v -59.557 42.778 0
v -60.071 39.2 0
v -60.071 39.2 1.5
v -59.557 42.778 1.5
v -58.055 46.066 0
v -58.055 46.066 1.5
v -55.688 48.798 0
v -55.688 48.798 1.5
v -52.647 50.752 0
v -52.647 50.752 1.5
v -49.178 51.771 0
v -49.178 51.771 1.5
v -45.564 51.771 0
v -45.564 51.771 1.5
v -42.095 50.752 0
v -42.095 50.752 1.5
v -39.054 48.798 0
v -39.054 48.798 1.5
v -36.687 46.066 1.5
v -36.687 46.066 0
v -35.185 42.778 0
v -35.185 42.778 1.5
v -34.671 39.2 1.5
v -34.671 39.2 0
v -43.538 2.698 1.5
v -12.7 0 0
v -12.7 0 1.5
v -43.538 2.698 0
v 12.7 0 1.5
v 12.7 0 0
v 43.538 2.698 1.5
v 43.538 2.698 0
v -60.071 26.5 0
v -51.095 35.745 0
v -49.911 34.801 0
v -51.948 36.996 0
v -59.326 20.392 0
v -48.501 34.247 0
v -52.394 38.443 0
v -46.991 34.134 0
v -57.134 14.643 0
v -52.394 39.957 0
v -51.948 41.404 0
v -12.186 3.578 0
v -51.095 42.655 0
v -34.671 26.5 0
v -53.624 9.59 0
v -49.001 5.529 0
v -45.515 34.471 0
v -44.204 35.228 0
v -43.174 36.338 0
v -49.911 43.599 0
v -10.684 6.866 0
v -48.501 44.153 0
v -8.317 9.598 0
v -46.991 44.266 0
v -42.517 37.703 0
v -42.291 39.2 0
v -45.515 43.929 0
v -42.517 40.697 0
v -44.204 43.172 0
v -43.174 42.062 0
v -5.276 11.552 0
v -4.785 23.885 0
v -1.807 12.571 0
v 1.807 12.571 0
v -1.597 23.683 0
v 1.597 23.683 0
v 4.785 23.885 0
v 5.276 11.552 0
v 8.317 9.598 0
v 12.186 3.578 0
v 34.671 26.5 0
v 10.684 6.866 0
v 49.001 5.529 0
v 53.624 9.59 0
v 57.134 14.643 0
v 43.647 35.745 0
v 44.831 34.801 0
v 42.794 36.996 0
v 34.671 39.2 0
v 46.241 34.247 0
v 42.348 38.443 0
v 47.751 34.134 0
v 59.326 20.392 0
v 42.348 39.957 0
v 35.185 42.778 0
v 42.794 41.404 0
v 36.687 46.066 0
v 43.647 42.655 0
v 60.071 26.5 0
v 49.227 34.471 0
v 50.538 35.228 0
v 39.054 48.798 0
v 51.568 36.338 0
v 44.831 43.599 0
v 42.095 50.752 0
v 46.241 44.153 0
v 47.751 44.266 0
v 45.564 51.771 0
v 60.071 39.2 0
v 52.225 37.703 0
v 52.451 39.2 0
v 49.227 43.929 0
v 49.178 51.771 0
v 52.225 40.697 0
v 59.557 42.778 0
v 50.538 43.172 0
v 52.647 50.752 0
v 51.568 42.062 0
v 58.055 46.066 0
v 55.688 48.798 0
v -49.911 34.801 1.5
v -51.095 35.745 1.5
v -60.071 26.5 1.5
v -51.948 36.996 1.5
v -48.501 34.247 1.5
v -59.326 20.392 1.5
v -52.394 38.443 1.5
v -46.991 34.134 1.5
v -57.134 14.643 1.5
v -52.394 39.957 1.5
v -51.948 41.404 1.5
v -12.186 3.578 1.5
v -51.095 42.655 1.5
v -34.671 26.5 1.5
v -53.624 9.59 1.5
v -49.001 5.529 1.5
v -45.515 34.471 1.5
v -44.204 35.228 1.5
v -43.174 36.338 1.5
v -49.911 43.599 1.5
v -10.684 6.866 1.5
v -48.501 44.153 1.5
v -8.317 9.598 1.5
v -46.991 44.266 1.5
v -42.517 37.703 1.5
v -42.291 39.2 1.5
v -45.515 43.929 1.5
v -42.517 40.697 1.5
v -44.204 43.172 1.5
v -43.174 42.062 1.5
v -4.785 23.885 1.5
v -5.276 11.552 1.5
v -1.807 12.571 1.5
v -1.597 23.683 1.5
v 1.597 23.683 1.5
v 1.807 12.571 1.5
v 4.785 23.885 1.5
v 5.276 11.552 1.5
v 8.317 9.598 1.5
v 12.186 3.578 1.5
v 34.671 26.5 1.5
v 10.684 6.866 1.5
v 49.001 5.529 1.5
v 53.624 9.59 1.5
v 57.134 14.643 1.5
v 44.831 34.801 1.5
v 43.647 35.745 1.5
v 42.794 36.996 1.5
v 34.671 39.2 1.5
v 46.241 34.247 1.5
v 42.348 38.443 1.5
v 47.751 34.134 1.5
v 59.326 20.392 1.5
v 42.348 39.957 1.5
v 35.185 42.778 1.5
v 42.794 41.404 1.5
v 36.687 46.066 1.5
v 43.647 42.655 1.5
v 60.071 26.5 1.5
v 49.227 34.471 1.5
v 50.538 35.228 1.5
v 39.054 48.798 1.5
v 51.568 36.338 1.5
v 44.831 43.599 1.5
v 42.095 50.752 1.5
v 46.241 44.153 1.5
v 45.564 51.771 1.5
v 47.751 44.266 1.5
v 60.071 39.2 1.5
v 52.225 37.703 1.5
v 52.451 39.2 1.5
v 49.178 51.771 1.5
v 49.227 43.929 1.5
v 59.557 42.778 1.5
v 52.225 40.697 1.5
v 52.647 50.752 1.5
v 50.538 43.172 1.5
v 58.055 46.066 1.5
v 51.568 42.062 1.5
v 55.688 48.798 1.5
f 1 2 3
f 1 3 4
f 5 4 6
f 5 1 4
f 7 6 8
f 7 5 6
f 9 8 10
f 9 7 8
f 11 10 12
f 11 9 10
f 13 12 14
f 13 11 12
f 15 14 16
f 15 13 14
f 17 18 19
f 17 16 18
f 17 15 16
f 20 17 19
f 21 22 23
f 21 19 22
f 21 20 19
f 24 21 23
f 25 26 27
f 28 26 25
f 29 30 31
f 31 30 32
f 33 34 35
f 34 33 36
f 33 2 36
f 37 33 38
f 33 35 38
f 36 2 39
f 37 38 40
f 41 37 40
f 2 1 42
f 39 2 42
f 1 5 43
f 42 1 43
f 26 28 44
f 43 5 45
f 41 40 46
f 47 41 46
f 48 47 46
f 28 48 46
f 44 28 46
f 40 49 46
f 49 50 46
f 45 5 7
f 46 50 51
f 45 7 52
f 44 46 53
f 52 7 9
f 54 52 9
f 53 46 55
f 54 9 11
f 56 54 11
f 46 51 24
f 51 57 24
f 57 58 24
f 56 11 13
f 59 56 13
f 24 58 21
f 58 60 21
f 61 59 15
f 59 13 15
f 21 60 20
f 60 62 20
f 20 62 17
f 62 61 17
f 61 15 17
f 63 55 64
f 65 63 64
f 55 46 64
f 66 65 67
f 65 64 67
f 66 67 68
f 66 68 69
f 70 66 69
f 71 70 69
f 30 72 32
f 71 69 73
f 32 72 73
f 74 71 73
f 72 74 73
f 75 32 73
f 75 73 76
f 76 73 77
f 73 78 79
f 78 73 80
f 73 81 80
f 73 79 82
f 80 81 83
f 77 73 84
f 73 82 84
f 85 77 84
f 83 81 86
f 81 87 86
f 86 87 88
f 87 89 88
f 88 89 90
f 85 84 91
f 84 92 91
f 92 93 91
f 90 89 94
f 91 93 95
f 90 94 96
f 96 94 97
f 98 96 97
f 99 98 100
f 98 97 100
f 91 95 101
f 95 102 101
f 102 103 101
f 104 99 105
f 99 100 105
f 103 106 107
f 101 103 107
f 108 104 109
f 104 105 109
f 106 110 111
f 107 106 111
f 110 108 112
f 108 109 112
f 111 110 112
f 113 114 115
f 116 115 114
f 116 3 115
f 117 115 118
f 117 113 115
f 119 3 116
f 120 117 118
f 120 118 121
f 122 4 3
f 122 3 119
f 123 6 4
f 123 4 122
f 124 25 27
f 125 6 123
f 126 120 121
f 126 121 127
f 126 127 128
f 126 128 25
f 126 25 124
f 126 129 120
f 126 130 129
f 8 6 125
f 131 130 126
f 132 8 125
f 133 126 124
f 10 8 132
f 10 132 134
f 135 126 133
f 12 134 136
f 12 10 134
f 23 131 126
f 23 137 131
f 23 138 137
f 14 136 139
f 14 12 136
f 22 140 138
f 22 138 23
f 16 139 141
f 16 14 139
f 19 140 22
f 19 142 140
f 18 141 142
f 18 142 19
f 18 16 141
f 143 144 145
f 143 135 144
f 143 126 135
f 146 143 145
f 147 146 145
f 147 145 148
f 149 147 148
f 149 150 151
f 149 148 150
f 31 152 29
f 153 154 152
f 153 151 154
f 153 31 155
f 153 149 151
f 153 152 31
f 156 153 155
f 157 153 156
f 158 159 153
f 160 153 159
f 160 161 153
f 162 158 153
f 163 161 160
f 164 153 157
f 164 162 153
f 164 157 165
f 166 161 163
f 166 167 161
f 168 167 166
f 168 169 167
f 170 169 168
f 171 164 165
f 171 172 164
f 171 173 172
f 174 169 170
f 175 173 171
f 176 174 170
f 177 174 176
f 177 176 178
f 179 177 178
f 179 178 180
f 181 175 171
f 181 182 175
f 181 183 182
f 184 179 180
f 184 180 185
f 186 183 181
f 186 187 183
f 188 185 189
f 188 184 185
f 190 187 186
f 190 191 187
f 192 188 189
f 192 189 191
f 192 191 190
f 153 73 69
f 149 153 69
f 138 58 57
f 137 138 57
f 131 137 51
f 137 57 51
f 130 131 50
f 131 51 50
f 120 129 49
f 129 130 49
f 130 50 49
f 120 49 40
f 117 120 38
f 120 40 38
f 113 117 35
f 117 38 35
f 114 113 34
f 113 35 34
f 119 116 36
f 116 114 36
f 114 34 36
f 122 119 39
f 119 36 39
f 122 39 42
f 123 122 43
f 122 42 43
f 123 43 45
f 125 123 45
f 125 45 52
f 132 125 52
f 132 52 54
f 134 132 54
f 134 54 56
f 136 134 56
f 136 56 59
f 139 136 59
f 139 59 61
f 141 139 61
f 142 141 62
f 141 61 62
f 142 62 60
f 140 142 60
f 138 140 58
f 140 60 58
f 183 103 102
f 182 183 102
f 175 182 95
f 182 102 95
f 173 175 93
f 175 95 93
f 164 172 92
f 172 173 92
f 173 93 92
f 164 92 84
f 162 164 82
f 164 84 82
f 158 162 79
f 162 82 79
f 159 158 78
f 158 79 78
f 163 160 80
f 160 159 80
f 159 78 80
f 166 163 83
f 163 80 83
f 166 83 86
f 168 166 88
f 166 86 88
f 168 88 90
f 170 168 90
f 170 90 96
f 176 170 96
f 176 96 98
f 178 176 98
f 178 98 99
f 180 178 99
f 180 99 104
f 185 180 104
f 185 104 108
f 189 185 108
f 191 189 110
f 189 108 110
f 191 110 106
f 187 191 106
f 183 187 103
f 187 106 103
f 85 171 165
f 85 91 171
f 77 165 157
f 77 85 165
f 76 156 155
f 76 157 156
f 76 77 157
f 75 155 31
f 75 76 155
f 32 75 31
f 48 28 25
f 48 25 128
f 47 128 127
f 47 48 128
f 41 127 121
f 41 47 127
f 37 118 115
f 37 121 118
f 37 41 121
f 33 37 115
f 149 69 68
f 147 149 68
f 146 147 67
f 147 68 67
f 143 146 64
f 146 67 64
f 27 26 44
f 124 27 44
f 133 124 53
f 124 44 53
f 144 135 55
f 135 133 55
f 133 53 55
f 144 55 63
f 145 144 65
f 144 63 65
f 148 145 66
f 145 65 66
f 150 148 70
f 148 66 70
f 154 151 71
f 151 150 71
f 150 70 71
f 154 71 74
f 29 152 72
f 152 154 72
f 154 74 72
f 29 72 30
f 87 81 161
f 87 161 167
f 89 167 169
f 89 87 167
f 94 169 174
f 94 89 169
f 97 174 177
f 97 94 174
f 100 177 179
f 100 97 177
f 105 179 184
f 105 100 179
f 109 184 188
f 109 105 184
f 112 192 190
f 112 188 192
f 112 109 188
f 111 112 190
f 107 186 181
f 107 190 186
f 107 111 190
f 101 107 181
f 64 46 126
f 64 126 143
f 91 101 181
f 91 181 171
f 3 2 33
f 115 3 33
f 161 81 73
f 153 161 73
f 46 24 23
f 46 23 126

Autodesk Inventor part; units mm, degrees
ref_plane "YZ Plane" through (0, 0, 0) normal (1, 0, 0) x (0, 1, 0)
ref_plane "XZ Plane" through (0, 0, 0) normal (0, 1, 0) x (-1, 0, 0)
ref_plane "XY Plane" through (0, 0, 0) normal (0, 0, 1) x (1, 0, 0)
sketch "Esboço1" plane through (0, 0, 0) normal (0, 0, 1) x (1, 0, 0)
  arc A0 (0, 12.7) -> (-12.7, 0) centre (0, 0) ccw
  circle A1 centre (-47.371, 39.2) radius 5.08
  line L0 (0, 0) -> (0, 58.6538)
  arc A2 (12.7, 0) -> (0, 12.7) centre (0, 0) ccw
  circle A3 centre (47.371, 39.2) radius 5.08
  line L1 (12.7, 0) -> (43.538, 2.698)
  line L2 (12.7, 0) -> (62.7, 0) construction
  arc A4 (60.071, 39.2) -> (34.671, 39.2) centre (47.371, 39.2) ccw
  line L3 (-12.7, 0) -> (-43.538, 2.698)
  arc A5 (-34.671, 39.2) -> (-60.071, 39.2) centre (-47.371, 39.2) ccw
  line L4 (34.671, 39.2) -> (34.671, 26.5)
  line L5 (-34.671, 39.2) -> (-34.671, 26.5)
  line L6 (60.071, 39.2) -> (60.071, 26.5)
  arc A6 (43.538, 2.698) -> (60.071, 26.5) centre (34.671, 26.5) ccw
  line L7 (-60.071, 39.2) -> (-60.071, 26.5)
  arc A7 (-60.071, 26.5) -> (-43.538, 2.698) centre (-34.671, 26.5) ccw
  line L8 (34.671, 26.5) -> (4.7852, 23.8853)
  line L9 (-34.671, 26.5) -> (-4.7852, 23.8853)
  arc A8 (-4.7852, 23.8853) -> (4.7852, 23.8853) centre (0, 74.0401) ccw
  point P0 (0, 25.2951)
  point P1 (0, 24.8739)
  dimension "d6" = 12.7
  dimension "d10" = 25.4
  dimension "d17" = 5
  dimension "d18" = 12.7
  dimension "d19" = 25.4
  dimension "d20" = 12.7
  dimension "d27" = 12.7
  dimension "d36" = 25.4
  dimension "d37" = 30
extrude "Extrusion2" add sketch "Esboço1" along normal blind 1.5
properties part number "FixaçãoTanque_1" material "Liga de aço"
